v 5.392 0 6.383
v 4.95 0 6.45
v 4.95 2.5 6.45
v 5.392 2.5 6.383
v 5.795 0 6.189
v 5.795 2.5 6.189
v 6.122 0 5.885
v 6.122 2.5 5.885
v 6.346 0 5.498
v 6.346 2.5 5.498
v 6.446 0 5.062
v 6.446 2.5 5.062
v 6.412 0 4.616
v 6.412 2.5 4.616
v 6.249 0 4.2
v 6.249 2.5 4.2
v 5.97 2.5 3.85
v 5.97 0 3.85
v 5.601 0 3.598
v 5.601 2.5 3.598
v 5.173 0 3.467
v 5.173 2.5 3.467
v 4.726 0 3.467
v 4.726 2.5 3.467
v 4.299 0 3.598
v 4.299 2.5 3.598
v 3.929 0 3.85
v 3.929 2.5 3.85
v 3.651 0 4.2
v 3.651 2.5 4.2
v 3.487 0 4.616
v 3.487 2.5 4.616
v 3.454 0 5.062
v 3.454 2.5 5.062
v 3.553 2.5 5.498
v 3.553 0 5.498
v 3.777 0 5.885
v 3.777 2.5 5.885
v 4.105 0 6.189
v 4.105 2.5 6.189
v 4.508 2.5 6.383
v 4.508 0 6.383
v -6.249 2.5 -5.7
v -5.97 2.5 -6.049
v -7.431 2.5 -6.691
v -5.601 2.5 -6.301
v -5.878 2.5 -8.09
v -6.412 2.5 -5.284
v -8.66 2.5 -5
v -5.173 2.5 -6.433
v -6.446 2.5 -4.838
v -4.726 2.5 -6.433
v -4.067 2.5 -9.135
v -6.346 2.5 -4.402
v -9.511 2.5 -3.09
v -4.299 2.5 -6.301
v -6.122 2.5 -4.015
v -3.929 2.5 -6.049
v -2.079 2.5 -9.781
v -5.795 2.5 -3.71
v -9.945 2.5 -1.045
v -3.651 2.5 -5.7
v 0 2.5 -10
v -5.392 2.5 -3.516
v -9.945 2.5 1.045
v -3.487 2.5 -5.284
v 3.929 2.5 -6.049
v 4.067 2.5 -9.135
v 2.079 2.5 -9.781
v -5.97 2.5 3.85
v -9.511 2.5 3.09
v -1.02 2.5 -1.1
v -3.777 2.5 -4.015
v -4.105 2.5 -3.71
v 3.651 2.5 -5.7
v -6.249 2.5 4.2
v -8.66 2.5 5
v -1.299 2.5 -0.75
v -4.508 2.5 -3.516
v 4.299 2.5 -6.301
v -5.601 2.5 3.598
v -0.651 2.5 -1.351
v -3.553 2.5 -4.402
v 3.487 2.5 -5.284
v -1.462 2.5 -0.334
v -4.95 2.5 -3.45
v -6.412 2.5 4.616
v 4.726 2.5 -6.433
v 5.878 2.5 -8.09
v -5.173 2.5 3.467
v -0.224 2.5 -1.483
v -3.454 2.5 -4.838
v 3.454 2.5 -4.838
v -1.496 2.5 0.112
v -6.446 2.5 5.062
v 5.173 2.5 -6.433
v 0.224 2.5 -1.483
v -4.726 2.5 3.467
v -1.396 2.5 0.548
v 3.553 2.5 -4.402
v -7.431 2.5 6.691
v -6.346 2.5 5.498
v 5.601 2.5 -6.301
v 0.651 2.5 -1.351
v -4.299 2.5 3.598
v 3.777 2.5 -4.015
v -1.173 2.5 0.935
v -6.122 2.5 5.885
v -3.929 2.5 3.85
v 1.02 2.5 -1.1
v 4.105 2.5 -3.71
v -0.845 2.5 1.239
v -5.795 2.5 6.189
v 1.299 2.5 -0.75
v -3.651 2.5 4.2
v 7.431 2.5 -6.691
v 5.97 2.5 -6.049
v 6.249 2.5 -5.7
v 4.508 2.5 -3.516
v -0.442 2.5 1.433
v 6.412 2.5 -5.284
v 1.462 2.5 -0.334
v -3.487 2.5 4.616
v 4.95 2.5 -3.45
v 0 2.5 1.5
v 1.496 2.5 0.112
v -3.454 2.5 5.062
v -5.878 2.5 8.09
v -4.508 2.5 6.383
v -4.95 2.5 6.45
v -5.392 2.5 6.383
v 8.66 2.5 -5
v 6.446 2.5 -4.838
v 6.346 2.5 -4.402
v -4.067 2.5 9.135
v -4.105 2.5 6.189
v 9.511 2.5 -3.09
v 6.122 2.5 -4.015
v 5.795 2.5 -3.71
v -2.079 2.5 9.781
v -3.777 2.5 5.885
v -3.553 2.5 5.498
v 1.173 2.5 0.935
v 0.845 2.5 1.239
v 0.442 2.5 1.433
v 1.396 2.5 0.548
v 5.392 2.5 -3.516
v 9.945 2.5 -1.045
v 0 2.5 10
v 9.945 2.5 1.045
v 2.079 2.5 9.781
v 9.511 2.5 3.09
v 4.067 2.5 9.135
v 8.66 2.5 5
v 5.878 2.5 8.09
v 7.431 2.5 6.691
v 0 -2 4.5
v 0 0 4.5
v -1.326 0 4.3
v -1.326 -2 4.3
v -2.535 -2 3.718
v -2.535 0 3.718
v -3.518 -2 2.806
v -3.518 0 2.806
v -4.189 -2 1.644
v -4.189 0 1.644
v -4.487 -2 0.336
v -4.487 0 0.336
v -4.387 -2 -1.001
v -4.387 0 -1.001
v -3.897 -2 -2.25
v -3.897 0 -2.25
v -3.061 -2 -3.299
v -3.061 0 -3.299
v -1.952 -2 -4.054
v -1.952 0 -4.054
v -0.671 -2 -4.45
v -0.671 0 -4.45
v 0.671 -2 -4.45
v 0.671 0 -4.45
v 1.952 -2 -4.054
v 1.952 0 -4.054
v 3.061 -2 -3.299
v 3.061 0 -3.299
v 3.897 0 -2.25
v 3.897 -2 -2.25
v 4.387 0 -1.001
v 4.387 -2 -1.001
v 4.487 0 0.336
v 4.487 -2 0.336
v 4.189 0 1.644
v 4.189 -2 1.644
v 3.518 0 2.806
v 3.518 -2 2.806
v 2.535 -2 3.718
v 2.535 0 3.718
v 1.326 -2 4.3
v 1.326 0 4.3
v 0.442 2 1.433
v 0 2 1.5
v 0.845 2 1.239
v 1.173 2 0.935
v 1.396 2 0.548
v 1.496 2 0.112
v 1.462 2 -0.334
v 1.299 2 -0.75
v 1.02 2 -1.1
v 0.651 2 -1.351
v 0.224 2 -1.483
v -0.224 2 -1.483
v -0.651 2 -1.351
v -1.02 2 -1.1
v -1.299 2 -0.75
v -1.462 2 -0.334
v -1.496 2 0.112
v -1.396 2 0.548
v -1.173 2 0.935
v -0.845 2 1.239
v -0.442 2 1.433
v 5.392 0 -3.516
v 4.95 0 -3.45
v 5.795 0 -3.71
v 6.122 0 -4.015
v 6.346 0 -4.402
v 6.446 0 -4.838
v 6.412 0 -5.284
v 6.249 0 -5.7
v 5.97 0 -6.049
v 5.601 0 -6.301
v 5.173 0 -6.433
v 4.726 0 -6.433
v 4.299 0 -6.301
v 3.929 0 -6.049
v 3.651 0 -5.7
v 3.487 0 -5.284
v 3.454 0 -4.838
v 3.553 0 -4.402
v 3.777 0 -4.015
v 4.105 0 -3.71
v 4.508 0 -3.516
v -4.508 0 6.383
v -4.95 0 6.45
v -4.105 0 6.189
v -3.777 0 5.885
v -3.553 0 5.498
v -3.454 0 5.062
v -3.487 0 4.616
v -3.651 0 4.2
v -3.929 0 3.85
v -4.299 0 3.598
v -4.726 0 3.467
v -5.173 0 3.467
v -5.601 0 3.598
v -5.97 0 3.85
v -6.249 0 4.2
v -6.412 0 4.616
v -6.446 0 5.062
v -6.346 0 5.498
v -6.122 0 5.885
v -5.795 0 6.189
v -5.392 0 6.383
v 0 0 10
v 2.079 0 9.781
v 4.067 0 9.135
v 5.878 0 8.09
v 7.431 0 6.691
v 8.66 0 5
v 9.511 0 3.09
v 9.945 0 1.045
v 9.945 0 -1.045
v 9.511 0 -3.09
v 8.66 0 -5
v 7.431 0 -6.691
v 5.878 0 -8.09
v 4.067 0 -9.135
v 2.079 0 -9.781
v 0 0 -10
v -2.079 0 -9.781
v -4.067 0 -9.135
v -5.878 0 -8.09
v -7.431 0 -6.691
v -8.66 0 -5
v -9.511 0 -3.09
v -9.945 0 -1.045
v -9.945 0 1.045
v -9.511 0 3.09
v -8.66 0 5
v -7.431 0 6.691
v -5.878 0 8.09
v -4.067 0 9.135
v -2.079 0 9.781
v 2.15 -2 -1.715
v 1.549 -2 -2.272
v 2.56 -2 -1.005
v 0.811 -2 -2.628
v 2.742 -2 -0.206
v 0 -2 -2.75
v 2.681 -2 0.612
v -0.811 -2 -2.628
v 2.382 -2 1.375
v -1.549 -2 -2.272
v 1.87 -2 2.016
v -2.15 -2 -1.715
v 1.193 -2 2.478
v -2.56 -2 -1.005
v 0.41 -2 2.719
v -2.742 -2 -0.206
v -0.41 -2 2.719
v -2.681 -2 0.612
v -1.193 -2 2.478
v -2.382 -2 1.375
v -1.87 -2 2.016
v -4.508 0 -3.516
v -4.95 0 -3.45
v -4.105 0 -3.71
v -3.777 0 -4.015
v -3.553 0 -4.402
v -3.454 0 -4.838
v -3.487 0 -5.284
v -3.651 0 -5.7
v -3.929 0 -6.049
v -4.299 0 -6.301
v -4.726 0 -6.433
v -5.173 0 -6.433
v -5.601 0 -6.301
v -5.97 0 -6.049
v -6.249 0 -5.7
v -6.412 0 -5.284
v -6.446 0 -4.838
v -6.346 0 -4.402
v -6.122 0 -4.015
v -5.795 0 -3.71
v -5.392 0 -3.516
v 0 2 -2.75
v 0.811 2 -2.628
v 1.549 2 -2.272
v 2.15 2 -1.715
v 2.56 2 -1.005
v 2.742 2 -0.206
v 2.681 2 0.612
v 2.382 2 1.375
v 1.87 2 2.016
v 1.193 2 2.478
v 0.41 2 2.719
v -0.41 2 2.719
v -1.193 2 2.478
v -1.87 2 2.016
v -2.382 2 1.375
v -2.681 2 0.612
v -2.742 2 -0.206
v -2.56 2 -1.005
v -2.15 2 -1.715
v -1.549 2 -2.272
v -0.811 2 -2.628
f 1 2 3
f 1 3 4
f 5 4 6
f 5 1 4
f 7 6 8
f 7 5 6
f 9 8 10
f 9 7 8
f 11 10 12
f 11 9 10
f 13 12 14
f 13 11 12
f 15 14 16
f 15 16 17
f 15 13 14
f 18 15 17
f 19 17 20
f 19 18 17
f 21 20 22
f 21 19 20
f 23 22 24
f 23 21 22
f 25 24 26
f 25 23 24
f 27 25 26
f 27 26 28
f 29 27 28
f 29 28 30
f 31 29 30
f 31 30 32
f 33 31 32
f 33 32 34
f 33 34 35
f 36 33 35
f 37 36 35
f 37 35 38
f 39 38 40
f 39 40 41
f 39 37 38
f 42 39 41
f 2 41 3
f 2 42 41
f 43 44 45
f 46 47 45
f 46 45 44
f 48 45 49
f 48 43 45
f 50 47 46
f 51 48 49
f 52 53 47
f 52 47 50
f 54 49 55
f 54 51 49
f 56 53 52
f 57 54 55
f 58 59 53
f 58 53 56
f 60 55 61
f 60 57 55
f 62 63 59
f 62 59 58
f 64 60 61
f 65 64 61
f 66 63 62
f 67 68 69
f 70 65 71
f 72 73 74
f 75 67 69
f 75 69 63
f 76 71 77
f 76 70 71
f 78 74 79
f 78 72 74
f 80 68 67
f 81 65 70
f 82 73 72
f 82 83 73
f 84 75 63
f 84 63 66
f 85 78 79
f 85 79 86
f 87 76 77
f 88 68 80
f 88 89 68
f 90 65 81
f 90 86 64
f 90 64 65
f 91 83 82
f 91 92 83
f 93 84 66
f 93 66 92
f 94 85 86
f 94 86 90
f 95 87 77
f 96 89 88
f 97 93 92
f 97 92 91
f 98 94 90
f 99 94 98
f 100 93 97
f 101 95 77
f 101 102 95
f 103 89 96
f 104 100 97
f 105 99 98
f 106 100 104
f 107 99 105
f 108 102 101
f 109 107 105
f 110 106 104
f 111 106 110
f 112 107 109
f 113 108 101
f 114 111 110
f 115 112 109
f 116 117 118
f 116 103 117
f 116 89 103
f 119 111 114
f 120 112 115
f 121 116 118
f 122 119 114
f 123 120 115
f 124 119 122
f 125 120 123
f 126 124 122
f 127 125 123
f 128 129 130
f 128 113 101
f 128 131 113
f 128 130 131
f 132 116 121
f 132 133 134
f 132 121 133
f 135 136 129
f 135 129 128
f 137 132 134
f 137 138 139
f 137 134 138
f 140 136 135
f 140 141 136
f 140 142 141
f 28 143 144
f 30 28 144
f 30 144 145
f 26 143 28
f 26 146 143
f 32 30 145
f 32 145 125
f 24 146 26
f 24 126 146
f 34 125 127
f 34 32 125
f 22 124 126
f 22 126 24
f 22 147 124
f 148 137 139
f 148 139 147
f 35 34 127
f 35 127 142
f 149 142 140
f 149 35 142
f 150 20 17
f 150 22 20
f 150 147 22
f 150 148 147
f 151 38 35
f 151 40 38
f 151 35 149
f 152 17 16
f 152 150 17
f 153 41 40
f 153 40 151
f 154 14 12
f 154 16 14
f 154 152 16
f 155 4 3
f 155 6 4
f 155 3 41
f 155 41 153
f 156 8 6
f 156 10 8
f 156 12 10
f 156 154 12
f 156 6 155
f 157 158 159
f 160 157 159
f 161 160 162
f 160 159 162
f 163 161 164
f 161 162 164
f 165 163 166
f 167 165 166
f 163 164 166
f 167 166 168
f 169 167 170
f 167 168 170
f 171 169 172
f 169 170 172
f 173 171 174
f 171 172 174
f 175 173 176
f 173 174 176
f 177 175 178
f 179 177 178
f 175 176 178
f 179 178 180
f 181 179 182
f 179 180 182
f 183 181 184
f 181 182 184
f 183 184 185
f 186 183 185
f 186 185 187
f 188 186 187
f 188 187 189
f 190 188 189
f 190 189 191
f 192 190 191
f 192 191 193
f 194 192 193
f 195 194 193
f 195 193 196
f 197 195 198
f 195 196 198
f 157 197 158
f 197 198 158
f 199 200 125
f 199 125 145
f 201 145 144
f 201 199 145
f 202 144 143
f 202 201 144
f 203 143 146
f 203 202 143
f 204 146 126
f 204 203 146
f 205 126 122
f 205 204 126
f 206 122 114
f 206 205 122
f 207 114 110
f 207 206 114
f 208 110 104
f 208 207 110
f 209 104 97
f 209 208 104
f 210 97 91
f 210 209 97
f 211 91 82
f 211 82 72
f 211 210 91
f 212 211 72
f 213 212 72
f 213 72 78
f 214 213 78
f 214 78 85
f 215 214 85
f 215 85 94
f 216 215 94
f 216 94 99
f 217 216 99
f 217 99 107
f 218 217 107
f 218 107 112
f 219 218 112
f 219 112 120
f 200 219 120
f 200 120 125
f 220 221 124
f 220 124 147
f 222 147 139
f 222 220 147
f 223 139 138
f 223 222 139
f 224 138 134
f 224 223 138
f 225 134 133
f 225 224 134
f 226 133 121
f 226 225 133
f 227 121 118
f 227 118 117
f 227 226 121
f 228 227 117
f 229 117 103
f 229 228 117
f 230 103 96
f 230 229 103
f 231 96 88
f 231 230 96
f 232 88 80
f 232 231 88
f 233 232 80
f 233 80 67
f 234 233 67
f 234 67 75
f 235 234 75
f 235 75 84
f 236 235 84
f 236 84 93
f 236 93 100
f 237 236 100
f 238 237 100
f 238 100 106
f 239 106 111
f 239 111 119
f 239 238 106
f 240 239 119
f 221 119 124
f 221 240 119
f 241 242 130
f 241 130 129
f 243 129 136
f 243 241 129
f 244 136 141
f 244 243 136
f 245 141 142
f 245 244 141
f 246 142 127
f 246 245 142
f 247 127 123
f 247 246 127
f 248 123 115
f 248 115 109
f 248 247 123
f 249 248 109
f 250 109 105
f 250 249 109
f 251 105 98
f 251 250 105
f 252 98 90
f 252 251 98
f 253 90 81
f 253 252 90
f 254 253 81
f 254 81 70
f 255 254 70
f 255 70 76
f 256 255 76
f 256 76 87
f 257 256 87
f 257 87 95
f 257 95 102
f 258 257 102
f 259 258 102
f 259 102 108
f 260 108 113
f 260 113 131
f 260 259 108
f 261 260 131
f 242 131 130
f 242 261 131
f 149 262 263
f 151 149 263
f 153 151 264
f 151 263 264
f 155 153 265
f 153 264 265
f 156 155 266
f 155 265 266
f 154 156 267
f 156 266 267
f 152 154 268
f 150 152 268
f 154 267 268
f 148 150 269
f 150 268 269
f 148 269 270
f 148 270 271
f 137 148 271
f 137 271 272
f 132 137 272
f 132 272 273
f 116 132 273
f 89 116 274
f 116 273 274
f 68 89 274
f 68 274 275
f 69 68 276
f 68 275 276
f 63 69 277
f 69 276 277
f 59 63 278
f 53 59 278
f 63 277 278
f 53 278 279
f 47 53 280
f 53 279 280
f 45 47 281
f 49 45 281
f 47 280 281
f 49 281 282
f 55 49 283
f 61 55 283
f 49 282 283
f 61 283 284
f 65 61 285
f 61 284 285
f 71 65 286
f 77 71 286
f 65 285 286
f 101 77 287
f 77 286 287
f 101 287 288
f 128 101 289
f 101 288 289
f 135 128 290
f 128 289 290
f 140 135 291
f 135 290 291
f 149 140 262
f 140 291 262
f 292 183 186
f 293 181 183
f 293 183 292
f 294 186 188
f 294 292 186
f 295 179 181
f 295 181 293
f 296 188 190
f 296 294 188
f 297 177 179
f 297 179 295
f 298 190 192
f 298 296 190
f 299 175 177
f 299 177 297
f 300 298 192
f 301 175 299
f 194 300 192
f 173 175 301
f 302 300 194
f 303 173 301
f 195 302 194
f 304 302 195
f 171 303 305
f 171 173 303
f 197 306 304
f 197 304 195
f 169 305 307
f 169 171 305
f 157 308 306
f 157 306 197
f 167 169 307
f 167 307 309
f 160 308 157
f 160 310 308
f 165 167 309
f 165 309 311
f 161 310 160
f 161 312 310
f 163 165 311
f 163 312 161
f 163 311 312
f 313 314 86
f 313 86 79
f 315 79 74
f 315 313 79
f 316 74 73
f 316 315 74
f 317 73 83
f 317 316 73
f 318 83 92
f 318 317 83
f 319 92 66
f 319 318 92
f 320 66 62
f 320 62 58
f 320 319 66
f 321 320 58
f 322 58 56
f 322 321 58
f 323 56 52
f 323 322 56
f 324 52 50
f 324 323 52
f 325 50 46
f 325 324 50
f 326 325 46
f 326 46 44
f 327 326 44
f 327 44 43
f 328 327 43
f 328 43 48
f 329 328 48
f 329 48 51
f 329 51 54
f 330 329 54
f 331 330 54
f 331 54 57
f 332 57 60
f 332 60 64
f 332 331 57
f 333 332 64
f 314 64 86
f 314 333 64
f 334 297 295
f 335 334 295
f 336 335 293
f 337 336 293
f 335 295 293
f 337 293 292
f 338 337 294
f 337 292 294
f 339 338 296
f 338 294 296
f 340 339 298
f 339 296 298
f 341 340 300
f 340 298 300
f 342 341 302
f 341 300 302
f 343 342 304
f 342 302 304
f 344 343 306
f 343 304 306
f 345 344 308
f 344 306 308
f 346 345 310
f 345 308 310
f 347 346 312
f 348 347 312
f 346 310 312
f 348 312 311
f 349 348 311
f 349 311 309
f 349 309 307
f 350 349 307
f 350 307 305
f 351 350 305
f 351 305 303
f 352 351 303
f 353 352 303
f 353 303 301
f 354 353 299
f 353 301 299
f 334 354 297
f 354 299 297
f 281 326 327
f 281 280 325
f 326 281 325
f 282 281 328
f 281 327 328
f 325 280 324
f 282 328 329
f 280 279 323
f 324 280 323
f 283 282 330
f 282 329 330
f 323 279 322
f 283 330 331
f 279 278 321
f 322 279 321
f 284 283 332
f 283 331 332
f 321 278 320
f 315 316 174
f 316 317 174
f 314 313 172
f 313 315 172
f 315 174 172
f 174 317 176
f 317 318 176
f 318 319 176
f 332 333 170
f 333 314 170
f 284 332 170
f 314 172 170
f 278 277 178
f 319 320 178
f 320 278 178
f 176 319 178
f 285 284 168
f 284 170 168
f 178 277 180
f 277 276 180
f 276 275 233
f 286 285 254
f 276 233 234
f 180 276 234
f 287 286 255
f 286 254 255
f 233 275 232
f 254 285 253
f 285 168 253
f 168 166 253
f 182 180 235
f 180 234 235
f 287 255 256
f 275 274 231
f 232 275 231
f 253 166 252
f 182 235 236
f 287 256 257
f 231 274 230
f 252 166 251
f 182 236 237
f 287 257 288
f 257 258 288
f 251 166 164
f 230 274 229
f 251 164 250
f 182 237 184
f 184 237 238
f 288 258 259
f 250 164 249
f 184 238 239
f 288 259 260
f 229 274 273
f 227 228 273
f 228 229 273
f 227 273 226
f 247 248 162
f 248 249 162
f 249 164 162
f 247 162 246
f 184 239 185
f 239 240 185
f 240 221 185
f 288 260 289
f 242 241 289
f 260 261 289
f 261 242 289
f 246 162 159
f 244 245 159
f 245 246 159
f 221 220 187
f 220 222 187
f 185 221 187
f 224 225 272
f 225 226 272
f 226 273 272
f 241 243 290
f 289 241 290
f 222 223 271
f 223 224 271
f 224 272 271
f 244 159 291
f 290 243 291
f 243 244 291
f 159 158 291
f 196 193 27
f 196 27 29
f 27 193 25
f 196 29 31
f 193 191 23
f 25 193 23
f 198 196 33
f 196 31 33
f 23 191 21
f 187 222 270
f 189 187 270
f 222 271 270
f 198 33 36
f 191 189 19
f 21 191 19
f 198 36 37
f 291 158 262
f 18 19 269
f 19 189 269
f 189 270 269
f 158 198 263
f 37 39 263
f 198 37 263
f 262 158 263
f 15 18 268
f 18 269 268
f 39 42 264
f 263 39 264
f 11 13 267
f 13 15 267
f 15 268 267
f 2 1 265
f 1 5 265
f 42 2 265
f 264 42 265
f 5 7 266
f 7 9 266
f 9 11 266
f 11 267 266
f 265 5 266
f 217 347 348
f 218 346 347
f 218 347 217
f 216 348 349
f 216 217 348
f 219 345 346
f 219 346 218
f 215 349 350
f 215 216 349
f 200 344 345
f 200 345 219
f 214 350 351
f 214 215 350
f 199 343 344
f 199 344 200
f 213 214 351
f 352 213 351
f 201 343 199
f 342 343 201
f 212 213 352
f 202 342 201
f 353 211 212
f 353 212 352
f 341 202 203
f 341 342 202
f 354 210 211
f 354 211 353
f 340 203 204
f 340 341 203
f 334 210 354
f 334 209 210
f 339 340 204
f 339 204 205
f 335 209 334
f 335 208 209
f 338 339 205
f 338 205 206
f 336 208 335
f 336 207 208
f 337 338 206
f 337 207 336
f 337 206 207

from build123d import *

# Parameters (mm, degrees)
SKETCH_1_R          = 10
SKETCH_1_R_2        = 1.5
EXTRUDE_1_DEPTH     = 2.5
SKETCH_2_R          = 4.5
EXTRUDE_2_DEPTH     = 2
SKETCH_3_R          = 2.75
CUT_EXTRUDE_1_DEPTH = 4


with BuildPart() as part:
    # 草图1 → 凸台-拉伸1 (new body)
    with BuildSketch(Plane(origin=(0, 0, 0), x_dir=(1, 0, 0), z_dir=(0, 1, 0))):
        with Locations(Location((0, 0, 0), (0, 0, 270))):
            Circle(SKETCH_1_R)
        with Locations(Location((0, 0, 0), (0, 0, 270))):
            Circle(SKETCH_1_R_2, mode=Mode.SUBTRACT)
        with Locations(Location((-4.949747468, 4.949747468, 0), (0, 0, 270))):
            Circle(SKETCH_1_R_2, mode=Mode.SUBTRACT)
        with Locations(Location((4.949747468, 4.949747468, 0), (0, 0, 270))):
            Circle(SKETCH_1_R_2, mode=Mode.SUBTRACT)
        with Locations(Location((4.949747468, -4.949747468, 0), (0, 0, 270))):
            Circle(SKETCH_1_R_2, mode=Mode.SUBTRACT)
        with Locations(Location((-4.949747468, -4.949747468, 0), (0, 0, 270))):
            Circle(SKETCH_1_R_2, mode=Mode.SUBTRACT)
    extrude(amount=EXTRUDE_1_DEPTH)

    # 草图2 → 凸台-拉伸2 (add)
    with BuildSketch(Plane.XZ):
        with Locations(Location((0, 0, 0), (0, 0, 90))):
            Circle(SKETCH_2_R)
    extrude(amount=EXTRUDE_2_DEPTH)

    # 草图3 → 切除-拉伸1 (cut)
    with BuildSketch(Plane.XZ.offset(2)):
        with Locations(Location((0, 0, 0), (0, 0, 270))):
            Circle(SKETCH_3_R)
    extrude(amount=-CUT_EXTRUDE_1_DEPTH, mode=Mode.SUBTRACT)


solid = part.part
